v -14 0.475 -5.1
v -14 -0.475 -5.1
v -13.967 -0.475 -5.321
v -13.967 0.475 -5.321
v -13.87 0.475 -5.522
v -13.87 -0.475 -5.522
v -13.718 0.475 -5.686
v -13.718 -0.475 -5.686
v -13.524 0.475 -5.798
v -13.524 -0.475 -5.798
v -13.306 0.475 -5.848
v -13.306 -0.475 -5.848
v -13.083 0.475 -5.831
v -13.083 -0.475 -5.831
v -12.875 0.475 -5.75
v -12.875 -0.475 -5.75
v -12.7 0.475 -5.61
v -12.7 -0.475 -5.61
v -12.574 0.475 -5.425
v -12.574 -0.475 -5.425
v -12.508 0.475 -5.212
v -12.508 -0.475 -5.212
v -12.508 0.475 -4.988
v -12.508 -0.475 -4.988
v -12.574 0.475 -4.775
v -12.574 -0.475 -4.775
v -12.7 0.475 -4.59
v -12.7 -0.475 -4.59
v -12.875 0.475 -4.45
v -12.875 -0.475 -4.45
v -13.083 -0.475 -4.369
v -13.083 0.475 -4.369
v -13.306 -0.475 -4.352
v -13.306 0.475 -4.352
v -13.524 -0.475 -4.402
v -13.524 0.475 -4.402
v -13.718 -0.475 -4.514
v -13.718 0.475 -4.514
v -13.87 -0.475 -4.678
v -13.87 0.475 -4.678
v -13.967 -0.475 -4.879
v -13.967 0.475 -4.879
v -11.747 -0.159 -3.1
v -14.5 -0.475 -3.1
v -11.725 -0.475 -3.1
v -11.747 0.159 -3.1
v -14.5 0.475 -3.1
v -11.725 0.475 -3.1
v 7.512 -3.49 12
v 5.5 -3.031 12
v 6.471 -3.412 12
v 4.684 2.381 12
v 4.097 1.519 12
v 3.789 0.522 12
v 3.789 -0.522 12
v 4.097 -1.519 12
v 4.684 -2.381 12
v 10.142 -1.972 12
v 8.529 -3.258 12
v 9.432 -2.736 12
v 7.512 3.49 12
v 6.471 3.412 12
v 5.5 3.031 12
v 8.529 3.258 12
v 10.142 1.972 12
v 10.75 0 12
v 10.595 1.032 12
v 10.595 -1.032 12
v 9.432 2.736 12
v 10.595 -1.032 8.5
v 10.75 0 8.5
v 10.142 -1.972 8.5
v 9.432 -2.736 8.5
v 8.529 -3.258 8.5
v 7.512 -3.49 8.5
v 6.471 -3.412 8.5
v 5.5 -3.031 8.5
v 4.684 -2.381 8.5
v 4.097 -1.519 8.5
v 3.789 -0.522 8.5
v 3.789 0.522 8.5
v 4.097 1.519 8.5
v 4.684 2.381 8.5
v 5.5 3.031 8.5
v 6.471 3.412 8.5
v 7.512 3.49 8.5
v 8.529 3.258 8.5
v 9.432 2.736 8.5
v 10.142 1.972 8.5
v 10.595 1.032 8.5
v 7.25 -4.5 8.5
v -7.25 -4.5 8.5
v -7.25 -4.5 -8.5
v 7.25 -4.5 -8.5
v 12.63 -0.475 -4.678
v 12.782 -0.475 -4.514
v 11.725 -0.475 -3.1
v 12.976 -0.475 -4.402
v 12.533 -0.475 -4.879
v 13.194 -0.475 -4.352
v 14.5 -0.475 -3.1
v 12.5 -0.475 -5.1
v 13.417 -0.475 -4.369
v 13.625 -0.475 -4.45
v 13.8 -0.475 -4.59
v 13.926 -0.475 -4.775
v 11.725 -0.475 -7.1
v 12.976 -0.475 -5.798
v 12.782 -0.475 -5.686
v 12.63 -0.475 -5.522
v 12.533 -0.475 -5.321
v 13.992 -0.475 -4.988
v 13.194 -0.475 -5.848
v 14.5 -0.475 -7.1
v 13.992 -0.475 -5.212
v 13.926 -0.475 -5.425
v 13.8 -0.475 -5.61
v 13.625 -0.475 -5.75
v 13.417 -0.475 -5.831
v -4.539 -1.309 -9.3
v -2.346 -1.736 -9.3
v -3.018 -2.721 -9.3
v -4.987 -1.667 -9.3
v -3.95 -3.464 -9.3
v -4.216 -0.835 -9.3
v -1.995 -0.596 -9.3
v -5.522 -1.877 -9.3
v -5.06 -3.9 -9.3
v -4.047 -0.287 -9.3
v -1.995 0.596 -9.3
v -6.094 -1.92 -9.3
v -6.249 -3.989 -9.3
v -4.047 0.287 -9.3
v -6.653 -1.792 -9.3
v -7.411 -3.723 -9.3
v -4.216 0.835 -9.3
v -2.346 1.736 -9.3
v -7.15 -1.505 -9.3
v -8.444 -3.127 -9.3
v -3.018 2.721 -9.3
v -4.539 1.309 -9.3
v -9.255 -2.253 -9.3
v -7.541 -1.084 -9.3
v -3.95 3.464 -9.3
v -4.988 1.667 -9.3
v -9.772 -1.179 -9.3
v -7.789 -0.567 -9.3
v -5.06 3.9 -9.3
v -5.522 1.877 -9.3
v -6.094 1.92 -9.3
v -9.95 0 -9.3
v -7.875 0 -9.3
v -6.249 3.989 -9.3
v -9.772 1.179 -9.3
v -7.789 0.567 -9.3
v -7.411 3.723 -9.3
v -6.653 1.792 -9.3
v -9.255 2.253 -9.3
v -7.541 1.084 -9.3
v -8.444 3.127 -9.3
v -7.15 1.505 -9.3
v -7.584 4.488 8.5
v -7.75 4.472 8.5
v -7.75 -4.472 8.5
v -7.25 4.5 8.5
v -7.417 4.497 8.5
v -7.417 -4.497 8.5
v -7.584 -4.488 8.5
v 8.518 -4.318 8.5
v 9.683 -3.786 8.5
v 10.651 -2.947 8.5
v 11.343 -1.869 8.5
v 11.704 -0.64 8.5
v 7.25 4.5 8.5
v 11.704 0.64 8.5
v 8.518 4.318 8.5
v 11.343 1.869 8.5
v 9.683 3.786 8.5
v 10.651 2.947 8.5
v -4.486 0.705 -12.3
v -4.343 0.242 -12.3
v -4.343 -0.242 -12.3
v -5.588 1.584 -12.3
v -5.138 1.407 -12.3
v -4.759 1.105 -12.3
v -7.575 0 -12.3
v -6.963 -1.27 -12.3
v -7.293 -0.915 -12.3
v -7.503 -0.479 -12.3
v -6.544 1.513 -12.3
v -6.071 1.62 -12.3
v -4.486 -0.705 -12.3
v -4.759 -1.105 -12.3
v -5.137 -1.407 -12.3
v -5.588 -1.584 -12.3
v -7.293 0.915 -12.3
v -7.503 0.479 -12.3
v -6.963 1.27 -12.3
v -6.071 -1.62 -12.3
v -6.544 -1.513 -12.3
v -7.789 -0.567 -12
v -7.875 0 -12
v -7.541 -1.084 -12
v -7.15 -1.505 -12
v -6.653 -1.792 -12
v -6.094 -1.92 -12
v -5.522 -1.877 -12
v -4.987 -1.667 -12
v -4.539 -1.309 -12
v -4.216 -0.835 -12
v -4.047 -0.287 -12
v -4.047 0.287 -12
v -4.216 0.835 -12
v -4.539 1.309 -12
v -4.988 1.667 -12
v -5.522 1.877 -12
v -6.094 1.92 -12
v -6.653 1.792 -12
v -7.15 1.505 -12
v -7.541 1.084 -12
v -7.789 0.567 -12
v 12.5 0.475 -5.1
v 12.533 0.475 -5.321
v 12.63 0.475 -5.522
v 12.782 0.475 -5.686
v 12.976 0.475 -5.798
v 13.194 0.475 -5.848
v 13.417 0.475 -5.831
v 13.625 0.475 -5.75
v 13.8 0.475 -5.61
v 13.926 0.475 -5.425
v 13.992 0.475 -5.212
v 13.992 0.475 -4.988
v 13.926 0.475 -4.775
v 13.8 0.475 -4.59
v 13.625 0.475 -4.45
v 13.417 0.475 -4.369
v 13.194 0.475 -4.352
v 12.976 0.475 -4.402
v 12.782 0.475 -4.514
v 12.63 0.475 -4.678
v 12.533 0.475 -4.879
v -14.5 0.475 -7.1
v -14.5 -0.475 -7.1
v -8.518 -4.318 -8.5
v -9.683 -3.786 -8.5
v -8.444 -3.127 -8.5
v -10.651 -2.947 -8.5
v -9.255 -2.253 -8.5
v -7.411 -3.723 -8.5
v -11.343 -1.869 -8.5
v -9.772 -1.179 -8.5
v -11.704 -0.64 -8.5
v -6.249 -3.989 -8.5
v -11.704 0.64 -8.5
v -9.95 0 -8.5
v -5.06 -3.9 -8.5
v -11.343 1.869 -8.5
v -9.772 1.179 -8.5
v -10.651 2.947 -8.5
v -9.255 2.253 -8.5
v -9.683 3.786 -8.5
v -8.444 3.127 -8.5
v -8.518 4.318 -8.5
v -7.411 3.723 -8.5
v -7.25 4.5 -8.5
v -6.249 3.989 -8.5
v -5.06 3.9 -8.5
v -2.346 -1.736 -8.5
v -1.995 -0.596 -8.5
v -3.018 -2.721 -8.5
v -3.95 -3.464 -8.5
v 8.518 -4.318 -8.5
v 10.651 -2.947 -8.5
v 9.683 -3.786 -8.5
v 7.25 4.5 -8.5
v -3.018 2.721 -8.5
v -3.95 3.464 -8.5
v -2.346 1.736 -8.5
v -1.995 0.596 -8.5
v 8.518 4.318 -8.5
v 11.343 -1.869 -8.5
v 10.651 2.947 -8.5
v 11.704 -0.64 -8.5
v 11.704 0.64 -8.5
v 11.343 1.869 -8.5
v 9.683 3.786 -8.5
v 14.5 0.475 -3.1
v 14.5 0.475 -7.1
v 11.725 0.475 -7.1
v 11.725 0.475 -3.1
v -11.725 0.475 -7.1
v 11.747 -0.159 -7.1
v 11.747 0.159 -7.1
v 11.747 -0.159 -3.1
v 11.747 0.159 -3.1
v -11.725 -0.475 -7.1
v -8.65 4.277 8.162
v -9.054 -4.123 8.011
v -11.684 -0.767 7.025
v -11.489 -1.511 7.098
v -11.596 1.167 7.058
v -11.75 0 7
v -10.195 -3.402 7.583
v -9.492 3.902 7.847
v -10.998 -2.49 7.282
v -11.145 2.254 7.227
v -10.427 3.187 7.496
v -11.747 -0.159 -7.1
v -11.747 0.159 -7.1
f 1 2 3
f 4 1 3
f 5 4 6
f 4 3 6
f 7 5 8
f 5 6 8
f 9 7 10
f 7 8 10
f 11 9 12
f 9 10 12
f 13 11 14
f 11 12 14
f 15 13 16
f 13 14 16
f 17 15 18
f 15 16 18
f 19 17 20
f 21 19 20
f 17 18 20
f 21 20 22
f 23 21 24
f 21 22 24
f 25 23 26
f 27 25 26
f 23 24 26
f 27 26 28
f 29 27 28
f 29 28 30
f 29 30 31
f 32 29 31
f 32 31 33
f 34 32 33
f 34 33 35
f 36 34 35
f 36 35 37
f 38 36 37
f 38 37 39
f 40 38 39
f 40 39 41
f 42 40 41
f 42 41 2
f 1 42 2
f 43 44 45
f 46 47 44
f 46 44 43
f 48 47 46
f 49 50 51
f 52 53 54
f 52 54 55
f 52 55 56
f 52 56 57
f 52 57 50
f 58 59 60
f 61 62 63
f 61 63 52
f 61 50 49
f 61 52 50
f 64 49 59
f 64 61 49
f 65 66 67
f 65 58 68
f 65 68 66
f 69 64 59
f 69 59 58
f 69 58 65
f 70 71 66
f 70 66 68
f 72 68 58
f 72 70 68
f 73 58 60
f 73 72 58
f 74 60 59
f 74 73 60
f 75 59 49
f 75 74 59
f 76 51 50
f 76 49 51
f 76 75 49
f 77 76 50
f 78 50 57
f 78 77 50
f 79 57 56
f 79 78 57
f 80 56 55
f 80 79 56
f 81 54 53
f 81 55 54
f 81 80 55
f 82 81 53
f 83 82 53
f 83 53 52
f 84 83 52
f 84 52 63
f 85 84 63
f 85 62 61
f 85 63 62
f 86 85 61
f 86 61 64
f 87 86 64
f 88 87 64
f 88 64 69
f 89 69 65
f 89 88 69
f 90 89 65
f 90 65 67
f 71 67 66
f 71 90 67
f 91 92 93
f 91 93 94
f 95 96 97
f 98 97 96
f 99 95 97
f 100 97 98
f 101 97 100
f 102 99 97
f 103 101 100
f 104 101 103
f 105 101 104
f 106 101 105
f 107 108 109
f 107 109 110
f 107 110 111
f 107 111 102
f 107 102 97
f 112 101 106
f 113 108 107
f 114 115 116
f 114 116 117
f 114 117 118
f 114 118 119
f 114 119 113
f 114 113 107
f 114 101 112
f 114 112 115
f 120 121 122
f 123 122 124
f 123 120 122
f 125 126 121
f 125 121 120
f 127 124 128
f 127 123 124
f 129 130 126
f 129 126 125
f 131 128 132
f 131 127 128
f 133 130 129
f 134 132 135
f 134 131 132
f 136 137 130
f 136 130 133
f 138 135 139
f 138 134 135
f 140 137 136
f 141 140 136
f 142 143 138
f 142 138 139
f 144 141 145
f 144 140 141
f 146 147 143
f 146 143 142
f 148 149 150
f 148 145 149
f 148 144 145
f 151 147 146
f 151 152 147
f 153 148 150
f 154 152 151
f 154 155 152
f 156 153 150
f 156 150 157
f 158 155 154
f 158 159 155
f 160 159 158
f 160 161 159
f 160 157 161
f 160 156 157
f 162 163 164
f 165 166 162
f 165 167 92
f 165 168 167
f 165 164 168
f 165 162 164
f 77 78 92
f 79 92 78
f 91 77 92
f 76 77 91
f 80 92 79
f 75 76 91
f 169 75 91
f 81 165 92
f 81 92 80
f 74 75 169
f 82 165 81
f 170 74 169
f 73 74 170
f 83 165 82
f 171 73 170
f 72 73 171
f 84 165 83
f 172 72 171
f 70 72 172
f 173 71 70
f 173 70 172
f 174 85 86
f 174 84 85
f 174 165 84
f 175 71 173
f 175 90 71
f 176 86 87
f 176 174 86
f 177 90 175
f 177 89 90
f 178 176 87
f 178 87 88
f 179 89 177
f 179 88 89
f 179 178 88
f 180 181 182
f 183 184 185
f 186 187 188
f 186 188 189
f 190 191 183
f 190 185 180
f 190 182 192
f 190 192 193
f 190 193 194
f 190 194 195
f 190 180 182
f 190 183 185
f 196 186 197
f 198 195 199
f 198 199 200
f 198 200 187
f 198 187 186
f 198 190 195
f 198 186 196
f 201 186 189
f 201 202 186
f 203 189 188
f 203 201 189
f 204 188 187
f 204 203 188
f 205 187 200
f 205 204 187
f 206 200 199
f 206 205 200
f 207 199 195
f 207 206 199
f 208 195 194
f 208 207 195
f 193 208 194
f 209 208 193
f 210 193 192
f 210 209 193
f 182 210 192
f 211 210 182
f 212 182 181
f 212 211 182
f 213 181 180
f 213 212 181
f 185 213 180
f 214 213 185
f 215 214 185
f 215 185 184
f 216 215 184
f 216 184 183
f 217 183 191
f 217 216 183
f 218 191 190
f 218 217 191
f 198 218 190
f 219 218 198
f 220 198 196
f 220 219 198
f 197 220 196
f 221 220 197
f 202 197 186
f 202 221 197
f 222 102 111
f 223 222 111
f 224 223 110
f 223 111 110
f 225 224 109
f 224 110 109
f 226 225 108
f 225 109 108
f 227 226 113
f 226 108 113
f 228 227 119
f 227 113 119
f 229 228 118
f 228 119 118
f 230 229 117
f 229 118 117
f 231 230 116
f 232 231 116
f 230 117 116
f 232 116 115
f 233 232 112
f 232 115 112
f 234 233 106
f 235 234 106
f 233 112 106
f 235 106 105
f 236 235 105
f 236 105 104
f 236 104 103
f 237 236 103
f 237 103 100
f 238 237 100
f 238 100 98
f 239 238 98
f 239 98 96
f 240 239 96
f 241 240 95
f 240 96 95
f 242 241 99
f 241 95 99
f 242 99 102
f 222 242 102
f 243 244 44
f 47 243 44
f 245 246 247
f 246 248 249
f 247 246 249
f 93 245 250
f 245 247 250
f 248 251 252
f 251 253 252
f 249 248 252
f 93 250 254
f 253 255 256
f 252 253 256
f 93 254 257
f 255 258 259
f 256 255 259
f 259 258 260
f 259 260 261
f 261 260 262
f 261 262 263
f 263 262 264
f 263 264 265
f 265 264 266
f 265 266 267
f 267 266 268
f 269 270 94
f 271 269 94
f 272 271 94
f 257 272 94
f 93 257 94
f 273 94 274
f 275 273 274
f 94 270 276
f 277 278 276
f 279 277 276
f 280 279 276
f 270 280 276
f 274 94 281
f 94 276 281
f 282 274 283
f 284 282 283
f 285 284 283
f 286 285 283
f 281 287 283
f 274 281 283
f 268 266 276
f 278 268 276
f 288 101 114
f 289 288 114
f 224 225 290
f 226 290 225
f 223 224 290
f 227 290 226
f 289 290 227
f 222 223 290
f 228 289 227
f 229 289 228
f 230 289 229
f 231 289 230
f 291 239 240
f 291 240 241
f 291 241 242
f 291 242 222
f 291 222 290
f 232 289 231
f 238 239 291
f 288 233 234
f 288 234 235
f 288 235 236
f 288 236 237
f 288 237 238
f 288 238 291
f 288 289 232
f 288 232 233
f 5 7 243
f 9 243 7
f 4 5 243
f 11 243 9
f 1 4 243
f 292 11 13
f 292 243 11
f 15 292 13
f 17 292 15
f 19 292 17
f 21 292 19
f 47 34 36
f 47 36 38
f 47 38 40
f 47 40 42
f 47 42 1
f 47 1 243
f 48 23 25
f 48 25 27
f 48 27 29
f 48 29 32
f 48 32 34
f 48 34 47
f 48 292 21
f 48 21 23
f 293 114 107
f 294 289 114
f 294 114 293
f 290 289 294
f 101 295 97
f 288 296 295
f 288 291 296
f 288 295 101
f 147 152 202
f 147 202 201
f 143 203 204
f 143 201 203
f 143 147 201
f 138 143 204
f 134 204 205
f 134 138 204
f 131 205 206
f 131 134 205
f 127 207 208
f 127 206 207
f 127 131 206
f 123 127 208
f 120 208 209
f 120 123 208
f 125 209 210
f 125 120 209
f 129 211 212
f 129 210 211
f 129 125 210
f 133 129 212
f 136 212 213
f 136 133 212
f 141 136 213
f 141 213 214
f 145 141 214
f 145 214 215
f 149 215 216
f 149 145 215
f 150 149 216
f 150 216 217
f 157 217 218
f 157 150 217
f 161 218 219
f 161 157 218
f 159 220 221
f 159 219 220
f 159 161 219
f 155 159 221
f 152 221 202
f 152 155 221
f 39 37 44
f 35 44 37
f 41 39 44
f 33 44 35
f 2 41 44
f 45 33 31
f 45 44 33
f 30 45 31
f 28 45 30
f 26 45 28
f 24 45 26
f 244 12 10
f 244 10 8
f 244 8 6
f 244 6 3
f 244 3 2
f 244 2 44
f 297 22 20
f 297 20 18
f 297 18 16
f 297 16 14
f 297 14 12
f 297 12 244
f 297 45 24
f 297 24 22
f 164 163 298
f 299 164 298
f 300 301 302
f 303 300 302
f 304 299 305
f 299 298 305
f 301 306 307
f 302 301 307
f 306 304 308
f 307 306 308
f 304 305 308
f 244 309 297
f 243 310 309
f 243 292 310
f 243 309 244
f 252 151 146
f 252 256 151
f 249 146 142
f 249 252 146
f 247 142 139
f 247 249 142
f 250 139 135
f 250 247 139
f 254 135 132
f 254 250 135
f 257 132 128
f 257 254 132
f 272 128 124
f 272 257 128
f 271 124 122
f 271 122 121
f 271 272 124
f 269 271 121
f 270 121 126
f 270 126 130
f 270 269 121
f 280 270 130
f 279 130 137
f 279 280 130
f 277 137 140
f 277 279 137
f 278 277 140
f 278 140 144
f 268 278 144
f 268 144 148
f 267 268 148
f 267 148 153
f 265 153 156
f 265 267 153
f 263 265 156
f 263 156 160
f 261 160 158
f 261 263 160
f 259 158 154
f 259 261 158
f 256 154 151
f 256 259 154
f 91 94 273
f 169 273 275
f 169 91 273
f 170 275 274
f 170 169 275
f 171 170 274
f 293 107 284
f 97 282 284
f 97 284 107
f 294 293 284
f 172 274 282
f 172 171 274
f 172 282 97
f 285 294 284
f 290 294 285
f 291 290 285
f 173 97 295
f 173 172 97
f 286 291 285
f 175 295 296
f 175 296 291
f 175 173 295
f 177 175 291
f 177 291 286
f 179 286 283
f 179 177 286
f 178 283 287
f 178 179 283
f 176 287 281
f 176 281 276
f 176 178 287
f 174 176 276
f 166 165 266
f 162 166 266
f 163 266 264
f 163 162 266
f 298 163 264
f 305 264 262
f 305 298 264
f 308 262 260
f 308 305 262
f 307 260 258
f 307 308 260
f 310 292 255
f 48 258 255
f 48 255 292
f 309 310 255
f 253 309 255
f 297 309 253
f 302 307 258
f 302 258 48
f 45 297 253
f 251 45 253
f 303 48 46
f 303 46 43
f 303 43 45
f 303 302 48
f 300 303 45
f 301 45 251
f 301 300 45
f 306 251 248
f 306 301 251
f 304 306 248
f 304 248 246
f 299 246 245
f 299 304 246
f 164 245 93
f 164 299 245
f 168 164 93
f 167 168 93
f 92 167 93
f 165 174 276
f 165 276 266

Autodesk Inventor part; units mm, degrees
ref_plane "YZ Plane" through (0, 0, 0) normal (1, 0, 0) x (0, 1, 0)
ref_plane "XZ Plane" through (0, 0, 0) normal (0, 1, 0) x (-1, 0, 0)
ref_plane "XY Plane" through (0, 0, 0) normal (0, 0, 1) x (1, 0, 0)
sketch "Эскиз1" plane through (0, 0, 0) normal (0, 0, 1) x (1, 0, 0)
  line L0 (-11.75, -4.5) -> (11.75, -4.5)
  line L1 (11.75, -4.5) -> (11.75, 4.5)
  line L2 (11.75, 4.5) -> (-11.75, 4.5)
  line L3 (-11.75, 4.5) -> (-11.75, -4.5)
  line L4 (-11.75, -4.5) -> (11.75, 4.5) construction
  line L5 (11.75, -4.5) -> (-11.75, 4.5) construction
  point P0 (0, 0)
  dimension "d0" = 23.5
  dimension "d1" = 9
extrude "Выдавливание1" add sketch "Эскиз1" along normal mid plane 17
sketch "Эскиз2" plane through (0, 0, 0) normal (0, 1, 0) x (-1, 0, 0)
  line L0 (14.5, -3.1) -> (-14.5, -3.1)
  line L1 (-14.5, -3.1) -> (-14.5, -7.1)
  line L2 (-14.5, -7.1) -> (14.5, -7.1)
  line L3 (14.5, -7.1) -> (14.5, -3.1)
  line L4 (-11.75, 8.5) -> (11.75, 8.5) projected
  line L5 (0, 8.5) -> (0, -8.5)
  line L6 (11.75, -8.5) -> (-11.75, -8.5) projected
  line L7 (14.5, -5.1) -> (-14.5, -5.1)
  line L8 (13.25, -5.1) -> (-13.25, -5.1)
  circle A0 centre (13.25, -5.1) radius 0.75
  circle A1 centre (-13.25, -5.1) radius 0.75
  point P0 (0, 0)
  point P1 (0, -7.1)
  point P2 (0, -5.1)
  dimension "d4" = 29
  dimension "d5" = 4
  dimension "d6" = 26.5
  dimension "d7" = 1.5
  dimension "d8" = 1.5
  dimension "d9" = 3.4
extrude "Выдавливание2" add sketch "Эскиз2" along normal mid plane 0.95 contours L3 L7 A0 L5 L0 | L5 L7 A1 L1 L0 | L3 L2 L5 L7 A0 | L5 L2 L1 L7 A1
fillet "Сопряжение1" radius 4.5 4 edges at (-11.75, -4.5, 0) (-11.75, 4.5, 0) (11.75, 4.5, 0) (11.75, -4.5, 0)
sketch "Эскиз3" plane through (0, 0, 8.5) normal (0, 0, 1) x (1, 0, 0)
  arc A0 (7.25, -4.5) -> (7.25, 4.5) centre (7.25, 0) ccw projected
  circle A1 centre (7.25, 0) radius 3.5
  point P0 (0, 0)
  dimension "d13" = 7
extrude "Выдавливание3" add sketch "Эскиз3" along normal blind 3.5
sketch "Эскиз4" plane through (-7.25, 4.5, -8.5) normal (0, 1, 0) x (1, 0, 0)
  line L0 (0, -17) -> (-4.5, -17) projected
  line L1 (-4.5, -17) -> (-4.5, -15.5)
  line L2 (-4.5, 0) -> (-4.5, -17) projected
  line L3 (-4.5, -17) -> (-0.5, -17)
  line L4 (-0.5, -17) -> (-4.5, -15.5)
  point P0 (7.25, -8.5)
  dimension "d16" = 1.5
  dimension "d17" = 4
extrude "Выдавливание4" cut sketch "Эскиз4" against normal blind 20
sketch "Эскиз5" plane through (0, 0, -8.5) normal (0, 0, -1) x (-1, 0, 0)
  line L0 (14.5, -0.475) -> (14.5, 0.475) projected
  line L1 (14.5, 0) -> (-14.5, 0)
  line L2 (-14.5, -0.475) -> (-14.5, 0.475) projected
  circle A0 centre (5.95, 0) radius 4
  line L3 (12.5, 0.475) -> (12.5, -0.475) projected
  line L4 (12.5, 0) -> (14, 0)
  line L5 (14, 0.475) -> (14, -0.475) projected
  line L6 (13.25, 0) -> (5.95, 0)
  point P0 (0, 0)
  dimension "d20" = 8
  dimension "d21" = 7.3
extrude "Выдавливание5" add sketch "Эскиз5" along normal blind 0.8
sketch "Эскиз6" plane through (-5.95, 0, -9.3) normal (0, 0, -1) x (-1, 0, 0)
  circle A0 centre (0, 0) radius 1.925
  point P0 (-5.95, 0)
  dimension "d24" = 3.85
extrude "Выдавливание6" add sketch "Эскиз6" along normal blind 3
chamfer "Фаска1" distance 0.3 angle 45 1 edges at (-4.025, 0, -12.3)
sketch "Эскиз7" plane through (0, 0, -8.5) normal (0, 0, -1) x (-1, 0, 0)
  circle A0 centre (5.95, 0) radius 4 projected
  arc A1 (-7.25, 4.5) -> (-7.25, -4.5) centre (-7.25, 0) ccw projected
  line L0 (-7.25, -4.5) -> (7.25, -4.5) projected
  arc A2 (7.25, -4.5) -> (7.25, 4.5) centre (7.25, 0) ccw projected
  line L1 (7.25, 4.5) -> (-7.25, 4.5) projected
  line L2 (7.25, -4.5) -> (-7.25, -4.5)
  line L3 (-7.25, -4.5) -> (-7.25, 4.5)
  line L4 (-7.25, 4.5) -> (7.25, 4.5)
  line L5 (7.25, 4.5) -> (7.25, -4.5)
  circle A3 centre (5.95, 0) radius 1.925 projected
  circle A4 centre (5.95, 0) radius 4 projected
  circle A5 centre (5.95, 0) radius 1.625 projected
  point P0 (0, 0)
properties part number "OCS-D008 B"
